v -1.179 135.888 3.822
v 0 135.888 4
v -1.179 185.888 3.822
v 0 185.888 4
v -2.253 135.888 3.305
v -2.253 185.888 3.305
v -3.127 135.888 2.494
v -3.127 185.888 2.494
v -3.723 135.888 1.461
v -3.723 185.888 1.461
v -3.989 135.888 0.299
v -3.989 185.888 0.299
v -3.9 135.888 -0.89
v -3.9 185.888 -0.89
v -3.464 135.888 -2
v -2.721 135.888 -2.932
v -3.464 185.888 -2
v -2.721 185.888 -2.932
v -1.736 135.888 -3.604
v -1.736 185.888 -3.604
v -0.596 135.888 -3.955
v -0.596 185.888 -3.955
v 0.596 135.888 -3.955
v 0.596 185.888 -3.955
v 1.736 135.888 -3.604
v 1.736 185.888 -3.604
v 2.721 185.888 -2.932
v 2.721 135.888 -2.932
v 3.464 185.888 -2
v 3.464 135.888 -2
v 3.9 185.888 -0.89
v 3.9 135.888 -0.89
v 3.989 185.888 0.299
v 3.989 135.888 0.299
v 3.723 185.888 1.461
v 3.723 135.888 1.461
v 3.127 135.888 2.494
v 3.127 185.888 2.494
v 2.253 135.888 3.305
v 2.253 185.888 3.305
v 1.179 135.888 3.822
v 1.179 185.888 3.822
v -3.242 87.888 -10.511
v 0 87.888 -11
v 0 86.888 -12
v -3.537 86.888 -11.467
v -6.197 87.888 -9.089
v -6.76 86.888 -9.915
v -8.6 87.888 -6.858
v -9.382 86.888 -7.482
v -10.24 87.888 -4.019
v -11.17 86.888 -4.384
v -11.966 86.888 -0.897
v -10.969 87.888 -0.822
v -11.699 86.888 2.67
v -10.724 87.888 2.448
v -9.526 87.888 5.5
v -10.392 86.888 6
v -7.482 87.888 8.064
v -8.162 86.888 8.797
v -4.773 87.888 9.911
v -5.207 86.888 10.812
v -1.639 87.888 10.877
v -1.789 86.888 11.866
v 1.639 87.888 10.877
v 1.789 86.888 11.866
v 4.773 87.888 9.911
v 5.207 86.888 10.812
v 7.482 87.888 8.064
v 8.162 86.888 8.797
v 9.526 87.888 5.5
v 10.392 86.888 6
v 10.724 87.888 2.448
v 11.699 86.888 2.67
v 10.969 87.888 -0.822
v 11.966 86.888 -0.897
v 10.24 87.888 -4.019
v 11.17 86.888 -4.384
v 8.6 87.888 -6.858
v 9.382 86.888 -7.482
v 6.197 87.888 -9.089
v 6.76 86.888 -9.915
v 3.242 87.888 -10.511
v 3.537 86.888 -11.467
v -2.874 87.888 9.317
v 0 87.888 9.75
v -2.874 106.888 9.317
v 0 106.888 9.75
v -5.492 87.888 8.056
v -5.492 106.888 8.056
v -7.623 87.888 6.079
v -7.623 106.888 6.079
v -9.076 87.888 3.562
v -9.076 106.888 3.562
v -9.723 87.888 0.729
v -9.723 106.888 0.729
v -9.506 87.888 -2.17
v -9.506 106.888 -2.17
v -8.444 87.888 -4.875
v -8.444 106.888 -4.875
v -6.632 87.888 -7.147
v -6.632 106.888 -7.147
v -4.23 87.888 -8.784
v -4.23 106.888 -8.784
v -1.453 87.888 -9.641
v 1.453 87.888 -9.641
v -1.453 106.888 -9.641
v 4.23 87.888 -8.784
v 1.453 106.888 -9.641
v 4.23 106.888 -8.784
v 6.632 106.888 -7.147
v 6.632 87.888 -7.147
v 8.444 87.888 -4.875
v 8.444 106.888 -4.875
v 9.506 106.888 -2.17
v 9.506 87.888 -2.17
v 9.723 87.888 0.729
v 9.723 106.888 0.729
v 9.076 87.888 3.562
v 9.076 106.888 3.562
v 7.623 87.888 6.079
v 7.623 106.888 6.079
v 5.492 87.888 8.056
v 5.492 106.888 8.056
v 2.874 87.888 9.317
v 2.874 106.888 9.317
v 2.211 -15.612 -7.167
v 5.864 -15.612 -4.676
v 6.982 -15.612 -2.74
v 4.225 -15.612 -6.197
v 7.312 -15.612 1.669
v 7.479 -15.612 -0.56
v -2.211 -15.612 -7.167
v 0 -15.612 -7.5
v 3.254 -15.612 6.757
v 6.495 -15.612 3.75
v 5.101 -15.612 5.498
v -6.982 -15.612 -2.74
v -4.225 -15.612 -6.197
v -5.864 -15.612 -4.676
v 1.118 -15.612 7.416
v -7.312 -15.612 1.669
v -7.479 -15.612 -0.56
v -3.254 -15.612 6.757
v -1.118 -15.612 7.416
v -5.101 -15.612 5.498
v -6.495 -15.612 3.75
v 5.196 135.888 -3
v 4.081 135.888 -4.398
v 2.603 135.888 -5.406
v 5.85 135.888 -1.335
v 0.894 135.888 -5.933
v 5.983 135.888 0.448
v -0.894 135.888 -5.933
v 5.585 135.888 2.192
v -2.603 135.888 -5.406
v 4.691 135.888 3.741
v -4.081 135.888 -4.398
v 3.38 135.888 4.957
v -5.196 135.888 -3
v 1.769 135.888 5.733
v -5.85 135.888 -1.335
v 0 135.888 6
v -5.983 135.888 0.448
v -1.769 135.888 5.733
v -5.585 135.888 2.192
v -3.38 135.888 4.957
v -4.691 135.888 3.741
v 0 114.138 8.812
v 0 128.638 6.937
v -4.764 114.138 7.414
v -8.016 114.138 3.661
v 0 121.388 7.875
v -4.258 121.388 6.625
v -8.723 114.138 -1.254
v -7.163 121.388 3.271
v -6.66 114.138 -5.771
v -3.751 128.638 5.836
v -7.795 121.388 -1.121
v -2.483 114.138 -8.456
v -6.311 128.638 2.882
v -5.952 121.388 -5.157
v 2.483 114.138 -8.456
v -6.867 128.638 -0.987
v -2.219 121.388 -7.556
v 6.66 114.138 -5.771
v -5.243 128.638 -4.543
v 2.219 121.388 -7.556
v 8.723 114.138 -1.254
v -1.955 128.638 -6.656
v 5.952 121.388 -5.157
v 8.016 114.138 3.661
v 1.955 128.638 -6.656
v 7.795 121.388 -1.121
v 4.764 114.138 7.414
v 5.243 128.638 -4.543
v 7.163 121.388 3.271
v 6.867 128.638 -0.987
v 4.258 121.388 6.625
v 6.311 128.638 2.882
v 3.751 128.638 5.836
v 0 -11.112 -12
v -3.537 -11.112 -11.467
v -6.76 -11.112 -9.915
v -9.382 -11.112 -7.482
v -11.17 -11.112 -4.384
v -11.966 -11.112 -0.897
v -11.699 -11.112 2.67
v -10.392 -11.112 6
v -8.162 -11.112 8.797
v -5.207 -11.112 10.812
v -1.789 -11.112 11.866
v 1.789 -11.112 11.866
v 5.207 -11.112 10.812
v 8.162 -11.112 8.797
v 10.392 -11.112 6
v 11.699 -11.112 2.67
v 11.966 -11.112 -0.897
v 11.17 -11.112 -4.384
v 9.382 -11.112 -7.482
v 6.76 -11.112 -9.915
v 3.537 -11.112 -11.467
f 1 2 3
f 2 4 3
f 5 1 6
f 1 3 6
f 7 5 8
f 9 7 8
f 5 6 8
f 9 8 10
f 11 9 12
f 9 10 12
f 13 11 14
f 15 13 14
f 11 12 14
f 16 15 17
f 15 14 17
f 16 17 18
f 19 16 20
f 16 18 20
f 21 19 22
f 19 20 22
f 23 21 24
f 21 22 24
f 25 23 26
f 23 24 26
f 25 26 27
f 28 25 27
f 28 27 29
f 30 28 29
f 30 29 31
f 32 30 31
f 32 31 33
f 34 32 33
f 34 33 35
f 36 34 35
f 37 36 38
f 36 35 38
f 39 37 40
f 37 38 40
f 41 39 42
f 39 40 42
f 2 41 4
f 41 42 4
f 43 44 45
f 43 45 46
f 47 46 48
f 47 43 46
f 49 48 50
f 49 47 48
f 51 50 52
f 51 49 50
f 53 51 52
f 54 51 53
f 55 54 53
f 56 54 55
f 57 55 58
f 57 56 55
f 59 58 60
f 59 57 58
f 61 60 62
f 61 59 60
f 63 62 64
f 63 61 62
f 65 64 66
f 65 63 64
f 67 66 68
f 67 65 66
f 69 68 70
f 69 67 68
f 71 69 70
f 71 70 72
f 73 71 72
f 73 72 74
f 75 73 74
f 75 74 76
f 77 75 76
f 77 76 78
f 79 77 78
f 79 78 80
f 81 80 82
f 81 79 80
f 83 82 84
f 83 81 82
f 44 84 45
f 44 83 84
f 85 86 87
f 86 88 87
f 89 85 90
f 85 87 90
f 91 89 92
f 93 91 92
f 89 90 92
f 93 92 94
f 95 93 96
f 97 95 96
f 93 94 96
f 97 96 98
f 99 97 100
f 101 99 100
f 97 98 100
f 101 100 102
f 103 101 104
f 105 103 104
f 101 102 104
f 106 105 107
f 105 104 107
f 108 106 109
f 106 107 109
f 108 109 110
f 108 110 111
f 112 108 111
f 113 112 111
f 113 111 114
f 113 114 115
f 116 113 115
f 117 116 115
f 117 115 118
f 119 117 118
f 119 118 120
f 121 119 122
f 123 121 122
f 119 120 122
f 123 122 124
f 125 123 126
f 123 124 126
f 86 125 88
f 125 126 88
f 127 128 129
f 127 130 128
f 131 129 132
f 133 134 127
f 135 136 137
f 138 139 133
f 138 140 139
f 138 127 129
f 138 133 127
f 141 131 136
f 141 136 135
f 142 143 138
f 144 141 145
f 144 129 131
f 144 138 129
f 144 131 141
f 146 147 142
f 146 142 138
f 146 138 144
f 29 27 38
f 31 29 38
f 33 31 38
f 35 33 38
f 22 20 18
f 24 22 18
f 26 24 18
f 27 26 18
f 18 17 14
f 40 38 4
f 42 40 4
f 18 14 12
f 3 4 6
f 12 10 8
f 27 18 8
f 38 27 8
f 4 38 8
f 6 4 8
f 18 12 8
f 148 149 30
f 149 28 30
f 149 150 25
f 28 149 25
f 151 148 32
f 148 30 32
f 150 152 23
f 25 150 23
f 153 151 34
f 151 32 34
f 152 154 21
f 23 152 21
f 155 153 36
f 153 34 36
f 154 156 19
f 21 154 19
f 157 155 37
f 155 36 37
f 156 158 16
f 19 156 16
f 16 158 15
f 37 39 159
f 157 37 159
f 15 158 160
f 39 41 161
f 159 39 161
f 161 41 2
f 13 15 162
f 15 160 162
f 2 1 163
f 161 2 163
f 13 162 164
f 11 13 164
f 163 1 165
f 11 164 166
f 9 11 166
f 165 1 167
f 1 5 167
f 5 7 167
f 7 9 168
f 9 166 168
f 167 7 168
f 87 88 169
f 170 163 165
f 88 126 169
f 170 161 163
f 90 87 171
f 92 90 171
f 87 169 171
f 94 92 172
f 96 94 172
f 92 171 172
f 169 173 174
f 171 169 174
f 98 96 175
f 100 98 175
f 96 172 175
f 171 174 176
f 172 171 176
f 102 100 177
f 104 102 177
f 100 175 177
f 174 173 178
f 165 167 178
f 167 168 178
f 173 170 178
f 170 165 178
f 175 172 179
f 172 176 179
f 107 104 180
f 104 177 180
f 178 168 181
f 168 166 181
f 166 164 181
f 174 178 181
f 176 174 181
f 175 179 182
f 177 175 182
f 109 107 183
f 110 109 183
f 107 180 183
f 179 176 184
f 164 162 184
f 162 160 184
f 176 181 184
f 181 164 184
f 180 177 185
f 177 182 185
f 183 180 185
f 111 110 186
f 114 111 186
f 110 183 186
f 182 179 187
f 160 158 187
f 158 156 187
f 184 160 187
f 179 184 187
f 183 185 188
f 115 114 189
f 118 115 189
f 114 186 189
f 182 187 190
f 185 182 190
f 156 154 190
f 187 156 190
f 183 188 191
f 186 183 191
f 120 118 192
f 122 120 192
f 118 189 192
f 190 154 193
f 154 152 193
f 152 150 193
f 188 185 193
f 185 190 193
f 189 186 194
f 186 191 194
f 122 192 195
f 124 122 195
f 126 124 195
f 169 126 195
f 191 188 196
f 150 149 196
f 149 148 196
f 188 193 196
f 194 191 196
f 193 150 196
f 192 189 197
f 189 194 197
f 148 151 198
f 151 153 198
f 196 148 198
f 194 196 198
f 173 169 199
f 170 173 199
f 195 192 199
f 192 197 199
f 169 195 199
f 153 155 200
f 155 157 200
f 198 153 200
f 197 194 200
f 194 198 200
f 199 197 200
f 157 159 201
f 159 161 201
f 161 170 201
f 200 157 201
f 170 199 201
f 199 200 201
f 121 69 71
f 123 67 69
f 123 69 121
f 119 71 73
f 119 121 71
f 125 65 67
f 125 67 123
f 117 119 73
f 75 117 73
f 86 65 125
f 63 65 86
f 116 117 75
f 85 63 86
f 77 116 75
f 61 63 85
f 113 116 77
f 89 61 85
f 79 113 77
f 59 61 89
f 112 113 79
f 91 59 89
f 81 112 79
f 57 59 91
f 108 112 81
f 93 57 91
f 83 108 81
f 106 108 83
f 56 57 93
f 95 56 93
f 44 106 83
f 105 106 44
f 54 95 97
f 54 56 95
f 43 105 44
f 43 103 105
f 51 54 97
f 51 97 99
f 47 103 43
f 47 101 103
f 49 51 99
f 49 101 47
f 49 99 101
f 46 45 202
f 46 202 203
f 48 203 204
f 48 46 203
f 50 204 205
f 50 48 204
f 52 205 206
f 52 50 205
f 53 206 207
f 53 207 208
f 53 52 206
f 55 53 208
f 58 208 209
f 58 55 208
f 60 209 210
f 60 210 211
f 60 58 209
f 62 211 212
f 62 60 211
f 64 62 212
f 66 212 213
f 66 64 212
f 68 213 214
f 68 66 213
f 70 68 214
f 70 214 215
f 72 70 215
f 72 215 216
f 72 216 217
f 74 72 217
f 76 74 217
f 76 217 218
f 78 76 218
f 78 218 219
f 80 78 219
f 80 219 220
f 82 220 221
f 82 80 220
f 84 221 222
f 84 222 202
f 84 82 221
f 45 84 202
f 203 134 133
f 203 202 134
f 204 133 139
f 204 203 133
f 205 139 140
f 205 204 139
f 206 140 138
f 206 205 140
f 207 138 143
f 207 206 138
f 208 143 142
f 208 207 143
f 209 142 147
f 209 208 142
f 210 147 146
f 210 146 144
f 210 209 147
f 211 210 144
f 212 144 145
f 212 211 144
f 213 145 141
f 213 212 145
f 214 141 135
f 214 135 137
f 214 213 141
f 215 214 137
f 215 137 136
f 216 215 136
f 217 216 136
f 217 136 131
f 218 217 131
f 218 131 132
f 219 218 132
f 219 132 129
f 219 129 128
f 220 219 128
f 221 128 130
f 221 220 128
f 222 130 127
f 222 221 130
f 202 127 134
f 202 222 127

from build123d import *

# Parameters (mm, degrees)
CHAFL_N2_SIZE = 1


with BuildPart() as part:
    # Croquis1 → Revolución1 (revolve)
    with BuildSketch(Plane.XY, mode=Mode.PRIVATE) as revoluci_n1_sk:
        Polygon((12, -11.11234319), (12, 87.88765681), (9.75, 87.88765681), (0, 87.88765681), (0, -15.61234319), (7.5, -15.61234319), align=None)
    revolve(revoluci_n1_sk.sketch.rotate(Axis((0, 0, 0), (0, 1, 0)), 90), axis=Axis((0, 0, 0), (0, 1, 0)))

    # Chaflán2
    chafl_n2_edges = [part.edges().sort_by_distance(p)[0] for p in [
        (0, 87.88765681, 12),
    ]]
    chamfer(chafl_n2_edges, length=CHAFL_N2_SIZE)

    # Croquis2 → Revolución2 (revolve)
    with BuildSketch(Plane.XY, mode=Mode.PRIVATE) as revoluci_n2_sk:
        Polygon((0, 87.88765681), (9.75, 87.88765681), (9.75, 106.88765681), (6, 135.88765681), (4, 135.88765681), (4, 185.88765681), (0, 185.88765681), (0, 135.88765681), align=None)
    revolve(revoluci_n2_sk.sketch.rotate(Axis((0, 135.88765681, 0), (0, -1, 0)), 90), axis=Axis((0, 135.88765681, 0), (0, -1, 0)))


solid = part.part
